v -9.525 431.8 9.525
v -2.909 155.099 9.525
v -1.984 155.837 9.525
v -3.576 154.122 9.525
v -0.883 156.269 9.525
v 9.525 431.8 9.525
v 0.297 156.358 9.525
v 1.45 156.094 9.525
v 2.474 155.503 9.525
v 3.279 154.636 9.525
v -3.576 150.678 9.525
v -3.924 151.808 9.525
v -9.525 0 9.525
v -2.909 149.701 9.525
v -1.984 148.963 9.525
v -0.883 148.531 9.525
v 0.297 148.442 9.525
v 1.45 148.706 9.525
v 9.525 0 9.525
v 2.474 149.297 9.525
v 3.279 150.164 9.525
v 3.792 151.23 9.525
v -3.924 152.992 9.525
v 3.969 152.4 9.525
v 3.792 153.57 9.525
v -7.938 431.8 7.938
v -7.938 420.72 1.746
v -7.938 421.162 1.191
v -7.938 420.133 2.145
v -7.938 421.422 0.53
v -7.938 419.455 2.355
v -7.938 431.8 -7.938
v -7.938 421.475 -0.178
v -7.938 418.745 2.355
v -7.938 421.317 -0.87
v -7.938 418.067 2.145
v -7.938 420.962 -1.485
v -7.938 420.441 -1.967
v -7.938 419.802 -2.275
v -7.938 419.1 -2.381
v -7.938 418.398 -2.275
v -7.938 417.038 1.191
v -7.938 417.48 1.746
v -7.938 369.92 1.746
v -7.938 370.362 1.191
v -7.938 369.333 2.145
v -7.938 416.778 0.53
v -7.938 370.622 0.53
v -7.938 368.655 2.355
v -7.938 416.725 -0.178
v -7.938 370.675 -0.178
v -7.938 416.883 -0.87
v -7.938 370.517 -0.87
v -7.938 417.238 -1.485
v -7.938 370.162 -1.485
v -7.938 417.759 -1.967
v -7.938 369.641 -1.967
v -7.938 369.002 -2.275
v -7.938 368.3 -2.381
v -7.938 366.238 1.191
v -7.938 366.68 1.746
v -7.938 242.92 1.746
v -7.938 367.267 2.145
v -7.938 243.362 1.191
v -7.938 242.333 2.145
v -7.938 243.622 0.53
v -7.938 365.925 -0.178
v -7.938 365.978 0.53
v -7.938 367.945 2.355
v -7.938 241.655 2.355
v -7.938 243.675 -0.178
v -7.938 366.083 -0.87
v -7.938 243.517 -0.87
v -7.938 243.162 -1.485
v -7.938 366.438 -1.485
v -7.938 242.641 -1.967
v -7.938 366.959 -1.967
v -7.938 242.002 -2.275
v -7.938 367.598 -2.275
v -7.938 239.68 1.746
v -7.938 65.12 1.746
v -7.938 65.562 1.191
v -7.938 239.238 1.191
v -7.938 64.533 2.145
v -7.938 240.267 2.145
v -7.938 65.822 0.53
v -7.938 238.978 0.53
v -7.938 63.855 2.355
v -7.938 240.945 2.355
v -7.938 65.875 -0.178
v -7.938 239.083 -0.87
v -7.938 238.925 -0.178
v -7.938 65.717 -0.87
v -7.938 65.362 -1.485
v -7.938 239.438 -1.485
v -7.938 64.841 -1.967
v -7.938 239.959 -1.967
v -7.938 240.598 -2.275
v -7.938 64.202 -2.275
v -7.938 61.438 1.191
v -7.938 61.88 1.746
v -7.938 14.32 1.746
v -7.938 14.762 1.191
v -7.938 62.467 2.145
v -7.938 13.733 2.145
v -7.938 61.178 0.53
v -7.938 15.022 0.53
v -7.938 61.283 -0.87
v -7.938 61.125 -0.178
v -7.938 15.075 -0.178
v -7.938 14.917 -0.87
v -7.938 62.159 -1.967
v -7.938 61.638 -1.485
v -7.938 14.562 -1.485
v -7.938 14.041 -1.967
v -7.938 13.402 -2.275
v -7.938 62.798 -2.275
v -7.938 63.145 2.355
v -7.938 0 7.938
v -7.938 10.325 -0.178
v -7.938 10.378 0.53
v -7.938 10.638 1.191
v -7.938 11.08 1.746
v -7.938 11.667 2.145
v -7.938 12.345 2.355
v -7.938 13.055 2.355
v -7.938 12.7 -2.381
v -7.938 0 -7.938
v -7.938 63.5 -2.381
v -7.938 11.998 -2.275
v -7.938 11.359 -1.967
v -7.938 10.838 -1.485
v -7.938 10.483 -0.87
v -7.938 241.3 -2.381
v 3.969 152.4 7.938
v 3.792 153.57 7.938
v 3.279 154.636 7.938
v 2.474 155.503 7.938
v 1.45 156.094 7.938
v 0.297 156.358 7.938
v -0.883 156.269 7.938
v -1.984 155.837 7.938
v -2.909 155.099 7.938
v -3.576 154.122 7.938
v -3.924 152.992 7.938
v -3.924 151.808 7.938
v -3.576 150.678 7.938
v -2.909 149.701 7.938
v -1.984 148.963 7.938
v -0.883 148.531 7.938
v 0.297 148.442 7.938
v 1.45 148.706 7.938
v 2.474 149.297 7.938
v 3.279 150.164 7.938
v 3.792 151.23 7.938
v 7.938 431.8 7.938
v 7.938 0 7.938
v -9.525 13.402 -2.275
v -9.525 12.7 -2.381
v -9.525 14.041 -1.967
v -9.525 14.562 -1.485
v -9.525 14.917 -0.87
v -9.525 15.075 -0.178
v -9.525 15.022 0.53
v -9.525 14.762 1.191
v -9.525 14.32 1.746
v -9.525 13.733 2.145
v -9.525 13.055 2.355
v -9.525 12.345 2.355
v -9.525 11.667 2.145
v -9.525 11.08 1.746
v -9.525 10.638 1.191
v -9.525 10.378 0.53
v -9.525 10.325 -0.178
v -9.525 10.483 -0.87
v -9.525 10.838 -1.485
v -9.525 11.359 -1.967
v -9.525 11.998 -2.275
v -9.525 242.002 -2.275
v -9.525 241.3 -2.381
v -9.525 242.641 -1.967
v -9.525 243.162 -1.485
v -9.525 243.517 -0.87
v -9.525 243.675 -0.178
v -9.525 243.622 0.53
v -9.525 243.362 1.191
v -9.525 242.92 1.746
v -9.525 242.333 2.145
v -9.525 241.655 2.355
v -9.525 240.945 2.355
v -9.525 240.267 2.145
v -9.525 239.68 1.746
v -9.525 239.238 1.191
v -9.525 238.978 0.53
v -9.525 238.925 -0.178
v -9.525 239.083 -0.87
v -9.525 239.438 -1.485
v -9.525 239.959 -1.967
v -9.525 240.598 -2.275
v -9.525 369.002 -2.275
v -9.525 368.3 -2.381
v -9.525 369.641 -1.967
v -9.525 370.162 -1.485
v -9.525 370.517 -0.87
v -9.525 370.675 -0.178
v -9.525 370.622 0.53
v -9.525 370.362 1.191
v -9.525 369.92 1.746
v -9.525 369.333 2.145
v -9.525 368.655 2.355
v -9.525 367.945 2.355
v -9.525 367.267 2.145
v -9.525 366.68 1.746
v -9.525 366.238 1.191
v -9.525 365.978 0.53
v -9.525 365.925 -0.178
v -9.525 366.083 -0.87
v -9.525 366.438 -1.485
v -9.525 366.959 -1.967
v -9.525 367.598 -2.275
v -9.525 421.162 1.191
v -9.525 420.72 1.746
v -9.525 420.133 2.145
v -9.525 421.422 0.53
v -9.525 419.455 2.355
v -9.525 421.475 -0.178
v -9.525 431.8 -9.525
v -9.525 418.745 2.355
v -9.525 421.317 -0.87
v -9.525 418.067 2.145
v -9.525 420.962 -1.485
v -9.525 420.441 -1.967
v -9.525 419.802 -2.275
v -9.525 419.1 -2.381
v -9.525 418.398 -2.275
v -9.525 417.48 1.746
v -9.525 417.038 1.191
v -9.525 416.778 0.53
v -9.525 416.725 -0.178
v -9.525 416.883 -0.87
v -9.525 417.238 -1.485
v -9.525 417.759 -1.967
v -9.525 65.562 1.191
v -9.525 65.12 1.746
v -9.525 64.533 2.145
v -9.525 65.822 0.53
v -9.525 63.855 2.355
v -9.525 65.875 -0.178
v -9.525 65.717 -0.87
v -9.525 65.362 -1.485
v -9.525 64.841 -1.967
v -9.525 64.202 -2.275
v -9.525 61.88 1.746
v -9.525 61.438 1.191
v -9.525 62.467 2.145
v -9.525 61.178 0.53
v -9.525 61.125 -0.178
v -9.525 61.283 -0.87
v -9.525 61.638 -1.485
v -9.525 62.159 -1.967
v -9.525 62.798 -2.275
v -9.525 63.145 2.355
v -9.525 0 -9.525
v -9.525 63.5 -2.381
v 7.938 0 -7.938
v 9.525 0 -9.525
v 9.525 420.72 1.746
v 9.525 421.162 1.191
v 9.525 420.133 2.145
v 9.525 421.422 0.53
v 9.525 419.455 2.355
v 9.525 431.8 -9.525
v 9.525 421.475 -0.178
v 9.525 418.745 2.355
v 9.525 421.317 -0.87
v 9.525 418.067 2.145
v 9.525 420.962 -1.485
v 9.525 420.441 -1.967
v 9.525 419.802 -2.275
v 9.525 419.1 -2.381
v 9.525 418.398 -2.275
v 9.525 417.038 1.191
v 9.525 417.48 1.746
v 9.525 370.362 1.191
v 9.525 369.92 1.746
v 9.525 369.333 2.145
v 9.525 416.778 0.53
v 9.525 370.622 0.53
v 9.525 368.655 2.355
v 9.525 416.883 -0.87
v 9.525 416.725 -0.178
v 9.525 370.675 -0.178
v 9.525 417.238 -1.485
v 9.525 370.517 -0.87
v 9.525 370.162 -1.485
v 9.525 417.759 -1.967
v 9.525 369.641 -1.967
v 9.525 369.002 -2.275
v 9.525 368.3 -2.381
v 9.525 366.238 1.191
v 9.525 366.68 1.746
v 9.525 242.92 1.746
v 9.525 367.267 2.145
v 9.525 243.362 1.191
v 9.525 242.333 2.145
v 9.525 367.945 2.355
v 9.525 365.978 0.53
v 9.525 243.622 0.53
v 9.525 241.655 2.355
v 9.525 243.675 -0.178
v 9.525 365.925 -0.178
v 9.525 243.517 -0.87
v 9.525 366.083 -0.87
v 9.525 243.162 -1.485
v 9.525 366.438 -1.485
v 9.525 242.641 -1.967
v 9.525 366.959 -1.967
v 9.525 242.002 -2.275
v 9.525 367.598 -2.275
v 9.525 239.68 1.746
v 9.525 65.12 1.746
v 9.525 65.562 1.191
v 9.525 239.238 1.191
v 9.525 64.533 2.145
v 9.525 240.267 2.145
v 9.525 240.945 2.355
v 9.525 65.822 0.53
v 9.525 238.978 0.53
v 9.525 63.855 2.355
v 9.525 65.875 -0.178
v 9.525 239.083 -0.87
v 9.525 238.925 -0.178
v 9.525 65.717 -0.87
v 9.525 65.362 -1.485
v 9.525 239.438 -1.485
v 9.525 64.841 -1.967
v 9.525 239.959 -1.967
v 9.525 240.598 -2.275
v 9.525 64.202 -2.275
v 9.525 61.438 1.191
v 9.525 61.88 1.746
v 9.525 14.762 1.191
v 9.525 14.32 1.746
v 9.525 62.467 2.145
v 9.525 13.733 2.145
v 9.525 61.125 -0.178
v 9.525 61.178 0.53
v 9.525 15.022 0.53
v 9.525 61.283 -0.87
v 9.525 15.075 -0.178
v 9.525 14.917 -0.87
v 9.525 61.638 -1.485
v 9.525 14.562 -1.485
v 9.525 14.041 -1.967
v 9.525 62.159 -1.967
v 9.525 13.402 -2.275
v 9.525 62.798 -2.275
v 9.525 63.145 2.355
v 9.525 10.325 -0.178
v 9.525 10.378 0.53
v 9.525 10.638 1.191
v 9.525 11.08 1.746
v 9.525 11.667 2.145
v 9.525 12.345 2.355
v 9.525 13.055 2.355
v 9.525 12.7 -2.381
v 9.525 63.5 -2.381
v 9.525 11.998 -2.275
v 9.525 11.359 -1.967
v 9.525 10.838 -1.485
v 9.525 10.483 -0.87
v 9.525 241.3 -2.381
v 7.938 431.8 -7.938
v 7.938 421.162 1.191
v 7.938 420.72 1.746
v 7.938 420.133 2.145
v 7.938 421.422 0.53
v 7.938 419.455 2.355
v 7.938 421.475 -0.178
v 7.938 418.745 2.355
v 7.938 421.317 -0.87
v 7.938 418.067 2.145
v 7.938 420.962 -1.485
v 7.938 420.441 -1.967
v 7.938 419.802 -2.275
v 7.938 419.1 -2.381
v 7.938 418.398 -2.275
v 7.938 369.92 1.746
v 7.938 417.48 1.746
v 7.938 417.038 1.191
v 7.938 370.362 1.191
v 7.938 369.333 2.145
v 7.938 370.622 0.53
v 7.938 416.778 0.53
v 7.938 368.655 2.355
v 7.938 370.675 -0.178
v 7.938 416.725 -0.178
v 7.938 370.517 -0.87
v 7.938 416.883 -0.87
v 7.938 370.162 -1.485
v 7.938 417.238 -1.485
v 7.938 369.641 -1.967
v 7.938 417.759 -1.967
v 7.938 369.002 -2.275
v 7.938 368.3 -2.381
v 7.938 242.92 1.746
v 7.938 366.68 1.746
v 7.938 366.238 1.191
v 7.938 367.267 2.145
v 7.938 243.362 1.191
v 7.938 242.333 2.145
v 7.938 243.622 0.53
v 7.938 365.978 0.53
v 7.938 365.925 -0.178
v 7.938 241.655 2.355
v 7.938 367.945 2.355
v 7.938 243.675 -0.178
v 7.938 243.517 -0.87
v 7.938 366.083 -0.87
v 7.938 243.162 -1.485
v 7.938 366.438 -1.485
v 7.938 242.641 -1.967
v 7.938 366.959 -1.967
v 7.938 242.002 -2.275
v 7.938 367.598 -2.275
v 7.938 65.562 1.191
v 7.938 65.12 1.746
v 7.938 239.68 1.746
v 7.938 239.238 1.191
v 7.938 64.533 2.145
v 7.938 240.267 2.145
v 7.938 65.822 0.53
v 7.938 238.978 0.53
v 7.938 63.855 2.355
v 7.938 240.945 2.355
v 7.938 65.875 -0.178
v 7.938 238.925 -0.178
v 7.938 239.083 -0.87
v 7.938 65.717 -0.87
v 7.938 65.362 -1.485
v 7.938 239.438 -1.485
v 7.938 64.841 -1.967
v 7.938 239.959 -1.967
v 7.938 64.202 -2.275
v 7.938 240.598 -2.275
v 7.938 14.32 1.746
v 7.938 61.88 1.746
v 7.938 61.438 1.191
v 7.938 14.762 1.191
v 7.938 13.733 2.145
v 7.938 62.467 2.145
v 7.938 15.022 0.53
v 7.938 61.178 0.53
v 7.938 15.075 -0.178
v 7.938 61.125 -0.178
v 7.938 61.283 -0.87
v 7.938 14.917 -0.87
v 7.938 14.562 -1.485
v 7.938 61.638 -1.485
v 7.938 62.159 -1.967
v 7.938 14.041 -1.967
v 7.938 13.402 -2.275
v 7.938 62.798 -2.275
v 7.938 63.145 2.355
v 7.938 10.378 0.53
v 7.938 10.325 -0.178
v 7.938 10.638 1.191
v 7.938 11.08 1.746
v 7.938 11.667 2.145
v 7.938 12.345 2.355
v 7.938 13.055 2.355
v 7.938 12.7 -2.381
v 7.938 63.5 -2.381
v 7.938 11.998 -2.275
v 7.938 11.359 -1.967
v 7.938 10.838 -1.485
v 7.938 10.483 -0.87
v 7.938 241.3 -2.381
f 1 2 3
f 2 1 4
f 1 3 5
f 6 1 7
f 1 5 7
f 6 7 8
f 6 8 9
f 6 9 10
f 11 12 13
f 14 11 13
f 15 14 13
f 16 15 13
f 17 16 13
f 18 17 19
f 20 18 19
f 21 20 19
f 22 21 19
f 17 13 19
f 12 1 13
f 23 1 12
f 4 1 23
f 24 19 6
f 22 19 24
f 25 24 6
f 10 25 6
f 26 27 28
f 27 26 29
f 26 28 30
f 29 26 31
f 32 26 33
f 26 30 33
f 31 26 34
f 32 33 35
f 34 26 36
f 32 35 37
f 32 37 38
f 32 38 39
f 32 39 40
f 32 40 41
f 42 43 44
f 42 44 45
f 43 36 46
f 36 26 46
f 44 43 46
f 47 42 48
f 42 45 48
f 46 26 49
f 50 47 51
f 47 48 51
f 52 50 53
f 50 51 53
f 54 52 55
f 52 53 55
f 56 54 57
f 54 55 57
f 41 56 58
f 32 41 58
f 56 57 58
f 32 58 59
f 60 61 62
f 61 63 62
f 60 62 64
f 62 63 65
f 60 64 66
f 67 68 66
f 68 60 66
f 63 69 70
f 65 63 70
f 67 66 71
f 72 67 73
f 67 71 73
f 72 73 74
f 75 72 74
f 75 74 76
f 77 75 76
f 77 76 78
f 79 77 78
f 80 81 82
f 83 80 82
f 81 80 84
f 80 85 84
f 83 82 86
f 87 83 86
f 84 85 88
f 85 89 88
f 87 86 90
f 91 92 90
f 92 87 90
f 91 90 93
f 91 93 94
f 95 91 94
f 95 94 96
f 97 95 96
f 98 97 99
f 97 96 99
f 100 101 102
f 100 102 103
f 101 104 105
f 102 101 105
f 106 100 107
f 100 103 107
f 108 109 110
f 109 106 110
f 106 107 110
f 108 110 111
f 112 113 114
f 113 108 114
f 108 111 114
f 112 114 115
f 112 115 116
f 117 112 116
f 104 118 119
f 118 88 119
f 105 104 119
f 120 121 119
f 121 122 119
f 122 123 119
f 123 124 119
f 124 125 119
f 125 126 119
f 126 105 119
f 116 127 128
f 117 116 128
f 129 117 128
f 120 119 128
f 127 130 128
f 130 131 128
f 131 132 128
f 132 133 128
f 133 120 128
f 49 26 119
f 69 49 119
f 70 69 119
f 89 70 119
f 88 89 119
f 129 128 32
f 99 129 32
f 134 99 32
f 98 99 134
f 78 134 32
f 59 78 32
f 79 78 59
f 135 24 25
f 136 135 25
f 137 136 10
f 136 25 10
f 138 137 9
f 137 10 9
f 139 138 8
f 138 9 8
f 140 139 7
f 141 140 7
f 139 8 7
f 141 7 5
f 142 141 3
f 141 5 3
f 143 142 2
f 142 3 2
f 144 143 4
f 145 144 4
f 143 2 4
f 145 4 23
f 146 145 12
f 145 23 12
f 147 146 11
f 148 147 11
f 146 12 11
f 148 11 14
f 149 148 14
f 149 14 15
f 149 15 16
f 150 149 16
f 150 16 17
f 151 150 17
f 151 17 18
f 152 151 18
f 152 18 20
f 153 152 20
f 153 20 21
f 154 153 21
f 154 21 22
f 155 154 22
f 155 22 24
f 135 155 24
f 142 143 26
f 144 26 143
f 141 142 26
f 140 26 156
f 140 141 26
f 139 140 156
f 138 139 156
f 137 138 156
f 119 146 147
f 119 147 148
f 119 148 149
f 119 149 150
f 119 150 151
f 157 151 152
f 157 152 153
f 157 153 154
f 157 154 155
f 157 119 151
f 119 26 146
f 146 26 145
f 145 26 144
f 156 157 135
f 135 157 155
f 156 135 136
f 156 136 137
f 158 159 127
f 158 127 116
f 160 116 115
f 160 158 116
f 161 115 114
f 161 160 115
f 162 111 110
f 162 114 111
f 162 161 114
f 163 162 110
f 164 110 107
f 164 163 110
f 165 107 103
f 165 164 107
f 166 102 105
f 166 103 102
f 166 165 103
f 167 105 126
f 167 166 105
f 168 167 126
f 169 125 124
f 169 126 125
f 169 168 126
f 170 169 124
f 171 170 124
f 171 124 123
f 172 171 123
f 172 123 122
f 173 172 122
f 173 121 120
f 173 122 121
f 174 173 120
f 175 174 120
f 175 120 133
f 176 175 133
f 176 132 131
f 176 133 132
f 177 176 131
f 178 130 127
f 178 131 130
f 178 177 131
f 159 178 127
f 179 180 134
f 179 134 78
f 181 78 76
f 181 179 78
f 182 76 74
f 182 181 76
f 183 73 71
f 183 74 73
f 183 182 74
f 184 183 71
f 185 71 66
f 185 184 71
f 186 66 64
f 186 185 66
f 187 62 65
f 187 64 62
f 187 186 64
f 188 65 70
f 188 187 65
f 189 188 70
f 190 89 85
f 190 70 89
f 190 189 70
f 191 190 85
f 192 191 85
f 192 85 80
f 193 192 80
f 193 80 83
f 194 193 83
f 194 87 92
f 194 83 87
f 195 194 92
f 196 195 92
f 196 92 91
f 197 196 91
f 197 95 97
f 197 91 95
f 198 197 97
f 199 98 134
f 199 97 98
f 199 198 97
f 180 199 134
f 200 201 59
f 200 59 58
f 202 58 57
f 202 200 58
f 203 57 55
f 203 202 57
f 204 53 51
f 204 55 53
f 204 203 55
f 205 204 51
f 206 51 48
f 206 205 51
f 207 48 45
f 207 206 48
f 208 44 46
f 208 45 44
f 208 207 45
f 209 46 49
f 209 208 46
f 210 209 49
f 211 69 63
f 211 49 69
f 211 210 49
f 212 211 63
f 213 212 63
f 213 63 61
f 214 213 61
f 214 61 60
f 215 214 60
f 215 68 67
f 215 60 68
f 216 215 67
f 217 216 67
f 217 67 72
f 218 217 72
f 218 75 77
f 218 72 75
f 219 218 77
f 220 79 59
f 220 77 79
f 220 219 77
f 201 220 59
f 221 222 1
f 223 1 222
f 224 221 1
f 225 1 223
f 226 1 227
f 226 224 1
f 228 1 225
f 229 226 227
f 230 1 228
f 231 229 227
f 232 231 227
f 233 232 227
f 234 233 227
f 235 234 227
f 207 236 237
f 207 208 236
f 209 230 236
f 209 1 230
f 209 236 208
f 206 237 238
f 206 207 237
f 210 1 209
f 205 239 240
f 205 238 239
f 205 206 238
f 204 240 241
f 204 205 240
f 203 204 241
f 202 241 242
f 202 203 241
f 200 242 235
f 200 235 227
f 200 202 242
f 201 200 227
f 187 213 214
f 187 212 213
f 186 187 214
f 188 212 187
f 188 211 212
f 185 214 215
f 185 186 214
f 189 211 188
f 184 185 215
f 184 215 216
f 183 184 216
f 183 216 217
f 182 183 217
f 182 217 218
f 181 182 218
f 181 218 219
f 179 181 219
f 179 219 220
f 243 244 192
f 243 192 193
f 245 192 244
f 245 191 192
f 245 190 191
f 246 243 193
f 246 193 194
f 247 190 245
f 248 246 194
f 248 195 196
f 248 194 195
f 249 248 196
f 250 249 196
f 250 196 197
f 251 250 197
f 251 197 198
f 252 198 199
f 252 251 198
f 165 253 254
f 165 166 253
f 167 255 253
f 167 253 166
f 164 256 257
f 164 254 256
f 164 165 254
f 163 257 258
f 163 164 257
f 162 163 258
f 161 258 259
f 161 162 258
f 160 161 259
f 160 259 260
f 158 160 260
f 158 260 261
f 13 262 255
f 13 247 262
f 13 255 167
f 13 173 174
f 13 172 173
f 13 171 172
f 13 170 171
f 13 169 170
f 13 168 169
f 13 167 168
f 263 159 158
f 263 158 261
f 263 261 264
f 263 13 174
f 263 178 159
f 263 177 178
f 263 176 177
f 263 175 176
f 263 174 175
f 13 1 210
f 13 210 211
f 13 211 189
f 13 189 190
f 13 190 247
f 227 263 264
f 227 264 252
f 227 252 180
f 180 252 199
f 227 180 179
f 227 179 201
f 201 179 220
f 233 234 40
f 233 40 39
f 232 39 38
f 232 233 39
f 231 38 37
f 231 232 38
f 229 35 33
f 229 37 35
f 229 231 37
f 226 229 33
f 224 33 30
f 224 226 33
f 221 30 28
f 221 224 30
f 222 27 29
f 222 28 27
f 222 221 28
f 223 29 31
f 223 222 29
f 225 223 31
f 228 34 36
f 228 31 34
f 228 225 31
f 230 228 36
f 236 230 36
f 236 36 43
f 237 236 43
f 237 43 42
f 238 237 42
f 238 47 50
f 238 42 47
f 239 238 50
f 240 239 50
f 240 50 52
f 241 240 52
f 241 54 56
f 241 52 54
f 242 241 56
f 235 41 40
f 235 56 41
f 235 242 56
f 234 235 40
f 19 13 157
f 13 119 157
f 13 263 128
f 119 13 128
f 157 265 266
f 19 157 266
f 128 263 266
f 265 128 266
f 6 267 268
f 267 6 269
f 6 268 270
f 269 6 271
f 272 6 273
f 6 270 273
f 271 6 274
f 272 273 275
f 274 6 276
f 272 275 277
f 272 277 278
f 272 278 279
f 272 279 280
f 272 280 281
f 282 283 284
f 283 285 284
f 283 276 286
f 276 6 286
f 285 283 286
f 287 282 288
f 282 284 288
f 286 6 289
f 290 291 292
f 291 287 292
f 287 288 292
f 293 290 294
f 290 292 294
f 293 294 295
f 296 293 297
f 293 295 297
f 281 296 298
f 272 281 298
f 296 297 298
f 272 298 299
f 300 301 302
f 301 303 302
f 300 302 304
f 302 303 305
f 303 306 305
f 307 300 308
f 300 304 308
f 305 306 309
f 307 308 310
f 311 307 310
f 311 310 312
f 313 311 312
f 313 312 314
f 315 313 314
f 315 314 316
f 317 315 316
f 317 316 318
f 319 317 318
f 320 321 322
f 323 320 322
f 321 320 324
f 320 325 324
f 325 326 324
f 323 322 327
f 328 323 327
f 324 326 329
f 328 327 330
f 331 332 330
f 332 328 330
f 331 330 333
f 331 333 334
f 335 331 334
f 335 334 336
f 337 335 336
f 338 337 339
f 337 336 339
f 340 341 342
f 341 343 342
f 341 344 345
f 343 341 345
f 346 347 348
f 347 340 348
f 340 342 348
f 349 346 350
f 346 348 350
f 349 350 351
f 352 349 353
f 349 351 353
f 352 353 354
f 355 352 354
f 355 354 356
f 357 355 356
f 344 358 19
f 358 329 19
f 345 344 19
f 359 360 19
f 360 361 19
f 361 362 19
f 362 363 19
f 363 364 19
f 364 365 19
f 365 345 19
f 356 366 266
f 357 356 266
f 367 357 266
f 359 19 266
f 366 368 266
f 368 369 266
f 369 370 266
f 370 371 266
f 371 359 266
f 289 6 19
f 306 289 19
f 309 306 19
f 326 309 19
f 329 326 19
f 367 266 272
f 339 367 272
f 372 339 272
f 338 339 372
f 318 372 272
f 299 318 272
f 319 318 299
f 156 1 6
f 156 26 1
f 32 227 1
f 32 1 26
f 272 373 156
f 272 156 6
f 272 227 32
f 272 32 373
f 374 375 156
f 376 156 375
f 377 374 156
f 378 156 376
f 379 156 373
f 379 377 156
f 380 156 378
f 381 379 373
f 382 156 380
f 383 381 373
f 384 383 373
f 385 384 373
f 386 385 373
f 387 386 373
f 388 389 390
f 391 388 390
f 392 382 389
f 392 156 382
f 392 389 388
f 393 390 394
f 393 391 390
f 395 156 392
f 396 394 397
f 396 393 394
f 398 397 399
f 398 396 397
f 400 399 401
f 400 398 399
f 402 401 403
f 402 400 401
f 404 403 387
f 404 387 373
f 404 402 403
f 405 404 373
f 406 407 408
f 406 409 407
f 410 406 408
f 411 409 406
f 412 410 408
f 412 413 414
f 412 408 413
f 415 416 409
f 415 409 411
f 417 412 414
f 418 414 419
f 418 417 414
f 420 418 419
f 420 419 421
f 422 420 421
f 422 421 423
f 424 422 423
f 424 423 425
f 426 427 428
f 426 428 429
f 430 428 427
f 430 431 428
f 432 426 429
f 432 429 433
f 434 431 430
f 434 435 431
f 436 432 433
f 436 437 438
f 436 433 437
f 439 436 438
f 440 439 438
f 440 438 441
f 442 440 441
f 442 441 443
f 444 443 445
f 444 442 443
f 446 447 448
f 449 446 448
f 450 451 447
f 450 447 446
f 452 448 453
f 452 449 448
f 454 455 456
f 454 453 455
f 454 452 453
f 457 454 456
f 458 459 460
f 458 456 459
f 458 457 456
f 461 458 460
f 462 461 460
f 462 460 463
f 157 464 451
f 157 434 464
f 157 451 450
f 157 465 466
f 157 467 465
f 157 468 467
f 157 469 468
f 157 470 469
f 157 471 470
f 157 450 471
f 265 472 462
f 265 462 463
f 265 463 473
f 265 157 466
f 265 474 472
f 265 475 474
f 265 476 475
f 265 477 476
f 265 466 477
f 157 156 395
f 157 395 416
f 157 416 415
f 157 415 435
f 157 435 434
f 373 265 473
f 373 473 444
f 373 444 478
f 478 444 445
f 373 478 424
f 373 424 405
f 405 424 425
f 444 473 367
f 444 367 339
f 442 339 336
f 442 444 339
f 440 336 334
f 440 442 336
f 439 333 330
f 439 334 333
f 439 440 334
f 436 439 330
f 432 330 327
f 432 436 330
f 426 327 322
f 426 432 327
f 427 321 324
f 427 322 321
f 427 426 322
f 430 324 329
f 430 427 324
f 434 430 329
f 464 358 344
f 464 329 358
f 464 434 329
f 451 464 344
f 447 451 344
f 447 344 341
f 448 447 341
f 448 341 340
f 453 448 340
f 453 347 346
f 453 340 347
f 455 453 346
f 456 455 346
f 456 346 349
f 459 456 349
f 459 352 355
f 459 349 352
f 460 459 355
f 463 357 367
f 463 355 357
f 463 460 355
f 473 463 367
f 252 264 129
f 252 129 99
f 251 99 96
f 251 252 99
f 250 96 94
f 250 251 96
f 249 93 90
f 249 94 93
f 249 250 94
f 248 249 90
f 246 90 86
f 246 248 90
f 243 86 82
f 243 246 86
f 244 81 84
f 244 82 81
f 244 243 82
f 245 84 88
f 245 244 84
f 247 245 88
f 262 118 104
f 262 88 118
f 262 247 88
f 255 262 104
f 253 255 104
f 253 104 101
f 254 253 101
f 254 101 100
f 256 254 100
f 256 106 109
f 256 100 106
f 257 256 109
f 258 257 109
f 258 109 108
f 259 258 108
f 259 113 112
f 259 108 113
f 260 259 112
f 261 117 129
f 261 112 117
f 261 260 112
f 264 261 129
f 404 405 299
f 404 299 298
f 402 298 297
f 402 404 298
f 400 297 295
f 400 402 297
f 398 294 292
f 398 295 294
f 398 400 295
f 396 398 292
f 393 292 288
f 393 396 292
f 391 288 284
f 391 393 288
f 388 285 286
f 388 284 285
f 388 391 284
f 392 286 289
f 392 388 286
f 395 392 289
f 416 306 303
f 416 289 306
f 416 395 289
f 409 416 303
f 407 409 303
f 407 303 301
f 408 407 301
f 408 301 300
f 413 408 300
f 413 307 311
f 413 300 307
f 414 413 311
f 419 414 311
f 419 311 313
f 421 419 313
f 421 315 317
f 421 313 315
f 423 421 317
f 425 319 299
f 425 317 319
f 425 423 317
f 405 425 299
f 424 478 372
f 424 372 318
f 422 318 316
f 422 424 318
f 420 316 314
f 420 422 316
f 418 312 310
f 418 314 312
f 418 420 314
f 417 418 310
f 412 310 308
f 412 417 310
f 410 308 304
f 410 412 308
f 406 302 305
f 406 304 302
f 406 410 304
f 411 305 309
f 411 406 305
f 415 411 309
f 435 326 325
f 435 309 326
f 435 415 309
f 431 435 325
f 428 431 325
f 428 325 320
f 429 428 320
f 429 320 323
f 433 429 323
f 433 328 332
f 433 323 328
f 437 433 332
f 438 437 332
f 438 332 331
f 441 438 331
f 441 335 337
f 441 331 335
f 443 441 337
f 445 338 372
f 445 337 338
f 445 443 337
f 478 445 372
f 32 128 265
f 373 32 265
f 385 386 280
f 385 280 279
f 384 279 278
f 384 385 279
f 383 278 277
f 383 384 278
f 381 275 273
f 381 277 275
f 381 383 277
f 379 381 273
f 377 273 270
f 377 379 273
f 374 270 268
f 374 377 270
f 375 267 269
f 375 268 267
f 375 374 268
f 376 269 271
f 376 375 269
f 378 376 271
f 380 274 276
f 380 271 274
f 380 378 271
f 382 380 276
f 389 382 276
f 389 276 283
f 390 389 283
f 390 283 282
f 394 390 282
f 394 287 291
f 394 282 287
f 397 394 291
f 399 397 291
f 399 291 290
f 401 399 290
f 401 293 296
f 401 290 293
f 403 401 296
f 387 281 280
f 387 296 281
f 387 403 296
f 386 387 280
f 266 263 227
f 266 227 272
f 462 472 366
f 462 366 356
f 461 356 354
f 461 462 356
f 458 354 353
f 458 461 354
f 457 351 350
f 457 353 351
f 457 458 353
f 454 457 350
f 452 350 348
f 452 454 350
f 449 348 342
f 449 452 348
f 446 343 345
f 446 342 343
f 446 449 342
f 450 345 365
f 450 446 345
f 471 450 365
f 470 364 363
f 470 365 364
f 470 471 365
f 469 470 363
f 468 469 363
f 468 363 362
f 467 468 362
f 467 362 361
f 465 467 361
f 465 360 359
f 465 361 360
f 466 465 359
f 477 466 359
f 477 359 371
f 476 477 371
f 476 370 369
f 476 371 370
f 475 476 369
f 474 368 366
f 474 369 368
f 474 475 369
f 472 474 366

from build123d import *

# Parameters (mm, degrees)
SKETCH1_W               = 19.05
SKETCH1_H               = 19.05
SKETCH1_W_2             = 15.875
SKETCH1_H_2             = 15.875
BOSS_EXTRUDE1_DEPTH     = 431.8
CUT_EXTRUDE1_REACH      = 434.325
SKETCH2_R               = 3.96875
CUT_EXTRUDE2_DEPTH      = 433.0100592
CUT_EXTRUDE2_DEPTH_BACK = 433.0100592
SKETCH3_R               = 2.38125


with BuildPart() as part:
    # Sketch1 → Boss-Extrude1 (new body)
    with BuildSketch(Plane(origin=(0, 0, 0), x_dir=(1, 0, 0), z_dir=(0, 1, 0))):
        Rectangle(SKETCH1_W, SKETCH1_H)
        Rectangle(SKETCH1_W_2, SKETCH1_H_2, mode=Mode.SUBTRACT)
    extrude(amount=BOSS_EXTRUDE1_DEPTH)

    # Sketch2 → Cut-Extrude1 (cut, up to next)
    with BuildSketch(Plane.XY.offset(9.525), mode=Mode.PRIVATE) as cut_extrude1_sk1:
        with Locations((0, 152.4)):
            Circle(SKETCH2_R)
    cut_extrude1_tool1 = extrude(cut_extrude1_sk1.sketch, amount=-CUT_EXTRUDE1_REACH, mode=Mode.PRIVATE) & part.part
    add(cut_extrude1_tool1.solids().sort_by_distance((0, 152.4, 9.525))[0], mode=Mode.SUBTRACT)

    # Sketch3 → Cut-Extrude2 (cut, two sides: drawn at the far end of the back side and taken through both)
    with BuildSketch(Plane(origin=(0, 0, 0), x_dir=(0, 0, -1), z_dir=(1, 0, 0)).offset(-CUT_EXTRUDE2_DEPTH_BACK)):
        with Locations((0, 12.7)):
            Circle(SKETCH3_R)
        with Locations((0, 63.5)):
            Circle(SKETCH3_R)
        with Locations((0, 241.3)):
            Circle(SKETCH3_R)
        with Locations((0, 368.3)):
            Circle(SKETCH3_R)
        with Locations((0, 419.1)):
            Circle(SKETCH3_R)
    extrude(amount=CUT_EXTRUDE2_DEPTH + CUT_EXTRUDE2_DEPTH_BACK, mode=Mode.SUBTRACT)


solid = part.part
